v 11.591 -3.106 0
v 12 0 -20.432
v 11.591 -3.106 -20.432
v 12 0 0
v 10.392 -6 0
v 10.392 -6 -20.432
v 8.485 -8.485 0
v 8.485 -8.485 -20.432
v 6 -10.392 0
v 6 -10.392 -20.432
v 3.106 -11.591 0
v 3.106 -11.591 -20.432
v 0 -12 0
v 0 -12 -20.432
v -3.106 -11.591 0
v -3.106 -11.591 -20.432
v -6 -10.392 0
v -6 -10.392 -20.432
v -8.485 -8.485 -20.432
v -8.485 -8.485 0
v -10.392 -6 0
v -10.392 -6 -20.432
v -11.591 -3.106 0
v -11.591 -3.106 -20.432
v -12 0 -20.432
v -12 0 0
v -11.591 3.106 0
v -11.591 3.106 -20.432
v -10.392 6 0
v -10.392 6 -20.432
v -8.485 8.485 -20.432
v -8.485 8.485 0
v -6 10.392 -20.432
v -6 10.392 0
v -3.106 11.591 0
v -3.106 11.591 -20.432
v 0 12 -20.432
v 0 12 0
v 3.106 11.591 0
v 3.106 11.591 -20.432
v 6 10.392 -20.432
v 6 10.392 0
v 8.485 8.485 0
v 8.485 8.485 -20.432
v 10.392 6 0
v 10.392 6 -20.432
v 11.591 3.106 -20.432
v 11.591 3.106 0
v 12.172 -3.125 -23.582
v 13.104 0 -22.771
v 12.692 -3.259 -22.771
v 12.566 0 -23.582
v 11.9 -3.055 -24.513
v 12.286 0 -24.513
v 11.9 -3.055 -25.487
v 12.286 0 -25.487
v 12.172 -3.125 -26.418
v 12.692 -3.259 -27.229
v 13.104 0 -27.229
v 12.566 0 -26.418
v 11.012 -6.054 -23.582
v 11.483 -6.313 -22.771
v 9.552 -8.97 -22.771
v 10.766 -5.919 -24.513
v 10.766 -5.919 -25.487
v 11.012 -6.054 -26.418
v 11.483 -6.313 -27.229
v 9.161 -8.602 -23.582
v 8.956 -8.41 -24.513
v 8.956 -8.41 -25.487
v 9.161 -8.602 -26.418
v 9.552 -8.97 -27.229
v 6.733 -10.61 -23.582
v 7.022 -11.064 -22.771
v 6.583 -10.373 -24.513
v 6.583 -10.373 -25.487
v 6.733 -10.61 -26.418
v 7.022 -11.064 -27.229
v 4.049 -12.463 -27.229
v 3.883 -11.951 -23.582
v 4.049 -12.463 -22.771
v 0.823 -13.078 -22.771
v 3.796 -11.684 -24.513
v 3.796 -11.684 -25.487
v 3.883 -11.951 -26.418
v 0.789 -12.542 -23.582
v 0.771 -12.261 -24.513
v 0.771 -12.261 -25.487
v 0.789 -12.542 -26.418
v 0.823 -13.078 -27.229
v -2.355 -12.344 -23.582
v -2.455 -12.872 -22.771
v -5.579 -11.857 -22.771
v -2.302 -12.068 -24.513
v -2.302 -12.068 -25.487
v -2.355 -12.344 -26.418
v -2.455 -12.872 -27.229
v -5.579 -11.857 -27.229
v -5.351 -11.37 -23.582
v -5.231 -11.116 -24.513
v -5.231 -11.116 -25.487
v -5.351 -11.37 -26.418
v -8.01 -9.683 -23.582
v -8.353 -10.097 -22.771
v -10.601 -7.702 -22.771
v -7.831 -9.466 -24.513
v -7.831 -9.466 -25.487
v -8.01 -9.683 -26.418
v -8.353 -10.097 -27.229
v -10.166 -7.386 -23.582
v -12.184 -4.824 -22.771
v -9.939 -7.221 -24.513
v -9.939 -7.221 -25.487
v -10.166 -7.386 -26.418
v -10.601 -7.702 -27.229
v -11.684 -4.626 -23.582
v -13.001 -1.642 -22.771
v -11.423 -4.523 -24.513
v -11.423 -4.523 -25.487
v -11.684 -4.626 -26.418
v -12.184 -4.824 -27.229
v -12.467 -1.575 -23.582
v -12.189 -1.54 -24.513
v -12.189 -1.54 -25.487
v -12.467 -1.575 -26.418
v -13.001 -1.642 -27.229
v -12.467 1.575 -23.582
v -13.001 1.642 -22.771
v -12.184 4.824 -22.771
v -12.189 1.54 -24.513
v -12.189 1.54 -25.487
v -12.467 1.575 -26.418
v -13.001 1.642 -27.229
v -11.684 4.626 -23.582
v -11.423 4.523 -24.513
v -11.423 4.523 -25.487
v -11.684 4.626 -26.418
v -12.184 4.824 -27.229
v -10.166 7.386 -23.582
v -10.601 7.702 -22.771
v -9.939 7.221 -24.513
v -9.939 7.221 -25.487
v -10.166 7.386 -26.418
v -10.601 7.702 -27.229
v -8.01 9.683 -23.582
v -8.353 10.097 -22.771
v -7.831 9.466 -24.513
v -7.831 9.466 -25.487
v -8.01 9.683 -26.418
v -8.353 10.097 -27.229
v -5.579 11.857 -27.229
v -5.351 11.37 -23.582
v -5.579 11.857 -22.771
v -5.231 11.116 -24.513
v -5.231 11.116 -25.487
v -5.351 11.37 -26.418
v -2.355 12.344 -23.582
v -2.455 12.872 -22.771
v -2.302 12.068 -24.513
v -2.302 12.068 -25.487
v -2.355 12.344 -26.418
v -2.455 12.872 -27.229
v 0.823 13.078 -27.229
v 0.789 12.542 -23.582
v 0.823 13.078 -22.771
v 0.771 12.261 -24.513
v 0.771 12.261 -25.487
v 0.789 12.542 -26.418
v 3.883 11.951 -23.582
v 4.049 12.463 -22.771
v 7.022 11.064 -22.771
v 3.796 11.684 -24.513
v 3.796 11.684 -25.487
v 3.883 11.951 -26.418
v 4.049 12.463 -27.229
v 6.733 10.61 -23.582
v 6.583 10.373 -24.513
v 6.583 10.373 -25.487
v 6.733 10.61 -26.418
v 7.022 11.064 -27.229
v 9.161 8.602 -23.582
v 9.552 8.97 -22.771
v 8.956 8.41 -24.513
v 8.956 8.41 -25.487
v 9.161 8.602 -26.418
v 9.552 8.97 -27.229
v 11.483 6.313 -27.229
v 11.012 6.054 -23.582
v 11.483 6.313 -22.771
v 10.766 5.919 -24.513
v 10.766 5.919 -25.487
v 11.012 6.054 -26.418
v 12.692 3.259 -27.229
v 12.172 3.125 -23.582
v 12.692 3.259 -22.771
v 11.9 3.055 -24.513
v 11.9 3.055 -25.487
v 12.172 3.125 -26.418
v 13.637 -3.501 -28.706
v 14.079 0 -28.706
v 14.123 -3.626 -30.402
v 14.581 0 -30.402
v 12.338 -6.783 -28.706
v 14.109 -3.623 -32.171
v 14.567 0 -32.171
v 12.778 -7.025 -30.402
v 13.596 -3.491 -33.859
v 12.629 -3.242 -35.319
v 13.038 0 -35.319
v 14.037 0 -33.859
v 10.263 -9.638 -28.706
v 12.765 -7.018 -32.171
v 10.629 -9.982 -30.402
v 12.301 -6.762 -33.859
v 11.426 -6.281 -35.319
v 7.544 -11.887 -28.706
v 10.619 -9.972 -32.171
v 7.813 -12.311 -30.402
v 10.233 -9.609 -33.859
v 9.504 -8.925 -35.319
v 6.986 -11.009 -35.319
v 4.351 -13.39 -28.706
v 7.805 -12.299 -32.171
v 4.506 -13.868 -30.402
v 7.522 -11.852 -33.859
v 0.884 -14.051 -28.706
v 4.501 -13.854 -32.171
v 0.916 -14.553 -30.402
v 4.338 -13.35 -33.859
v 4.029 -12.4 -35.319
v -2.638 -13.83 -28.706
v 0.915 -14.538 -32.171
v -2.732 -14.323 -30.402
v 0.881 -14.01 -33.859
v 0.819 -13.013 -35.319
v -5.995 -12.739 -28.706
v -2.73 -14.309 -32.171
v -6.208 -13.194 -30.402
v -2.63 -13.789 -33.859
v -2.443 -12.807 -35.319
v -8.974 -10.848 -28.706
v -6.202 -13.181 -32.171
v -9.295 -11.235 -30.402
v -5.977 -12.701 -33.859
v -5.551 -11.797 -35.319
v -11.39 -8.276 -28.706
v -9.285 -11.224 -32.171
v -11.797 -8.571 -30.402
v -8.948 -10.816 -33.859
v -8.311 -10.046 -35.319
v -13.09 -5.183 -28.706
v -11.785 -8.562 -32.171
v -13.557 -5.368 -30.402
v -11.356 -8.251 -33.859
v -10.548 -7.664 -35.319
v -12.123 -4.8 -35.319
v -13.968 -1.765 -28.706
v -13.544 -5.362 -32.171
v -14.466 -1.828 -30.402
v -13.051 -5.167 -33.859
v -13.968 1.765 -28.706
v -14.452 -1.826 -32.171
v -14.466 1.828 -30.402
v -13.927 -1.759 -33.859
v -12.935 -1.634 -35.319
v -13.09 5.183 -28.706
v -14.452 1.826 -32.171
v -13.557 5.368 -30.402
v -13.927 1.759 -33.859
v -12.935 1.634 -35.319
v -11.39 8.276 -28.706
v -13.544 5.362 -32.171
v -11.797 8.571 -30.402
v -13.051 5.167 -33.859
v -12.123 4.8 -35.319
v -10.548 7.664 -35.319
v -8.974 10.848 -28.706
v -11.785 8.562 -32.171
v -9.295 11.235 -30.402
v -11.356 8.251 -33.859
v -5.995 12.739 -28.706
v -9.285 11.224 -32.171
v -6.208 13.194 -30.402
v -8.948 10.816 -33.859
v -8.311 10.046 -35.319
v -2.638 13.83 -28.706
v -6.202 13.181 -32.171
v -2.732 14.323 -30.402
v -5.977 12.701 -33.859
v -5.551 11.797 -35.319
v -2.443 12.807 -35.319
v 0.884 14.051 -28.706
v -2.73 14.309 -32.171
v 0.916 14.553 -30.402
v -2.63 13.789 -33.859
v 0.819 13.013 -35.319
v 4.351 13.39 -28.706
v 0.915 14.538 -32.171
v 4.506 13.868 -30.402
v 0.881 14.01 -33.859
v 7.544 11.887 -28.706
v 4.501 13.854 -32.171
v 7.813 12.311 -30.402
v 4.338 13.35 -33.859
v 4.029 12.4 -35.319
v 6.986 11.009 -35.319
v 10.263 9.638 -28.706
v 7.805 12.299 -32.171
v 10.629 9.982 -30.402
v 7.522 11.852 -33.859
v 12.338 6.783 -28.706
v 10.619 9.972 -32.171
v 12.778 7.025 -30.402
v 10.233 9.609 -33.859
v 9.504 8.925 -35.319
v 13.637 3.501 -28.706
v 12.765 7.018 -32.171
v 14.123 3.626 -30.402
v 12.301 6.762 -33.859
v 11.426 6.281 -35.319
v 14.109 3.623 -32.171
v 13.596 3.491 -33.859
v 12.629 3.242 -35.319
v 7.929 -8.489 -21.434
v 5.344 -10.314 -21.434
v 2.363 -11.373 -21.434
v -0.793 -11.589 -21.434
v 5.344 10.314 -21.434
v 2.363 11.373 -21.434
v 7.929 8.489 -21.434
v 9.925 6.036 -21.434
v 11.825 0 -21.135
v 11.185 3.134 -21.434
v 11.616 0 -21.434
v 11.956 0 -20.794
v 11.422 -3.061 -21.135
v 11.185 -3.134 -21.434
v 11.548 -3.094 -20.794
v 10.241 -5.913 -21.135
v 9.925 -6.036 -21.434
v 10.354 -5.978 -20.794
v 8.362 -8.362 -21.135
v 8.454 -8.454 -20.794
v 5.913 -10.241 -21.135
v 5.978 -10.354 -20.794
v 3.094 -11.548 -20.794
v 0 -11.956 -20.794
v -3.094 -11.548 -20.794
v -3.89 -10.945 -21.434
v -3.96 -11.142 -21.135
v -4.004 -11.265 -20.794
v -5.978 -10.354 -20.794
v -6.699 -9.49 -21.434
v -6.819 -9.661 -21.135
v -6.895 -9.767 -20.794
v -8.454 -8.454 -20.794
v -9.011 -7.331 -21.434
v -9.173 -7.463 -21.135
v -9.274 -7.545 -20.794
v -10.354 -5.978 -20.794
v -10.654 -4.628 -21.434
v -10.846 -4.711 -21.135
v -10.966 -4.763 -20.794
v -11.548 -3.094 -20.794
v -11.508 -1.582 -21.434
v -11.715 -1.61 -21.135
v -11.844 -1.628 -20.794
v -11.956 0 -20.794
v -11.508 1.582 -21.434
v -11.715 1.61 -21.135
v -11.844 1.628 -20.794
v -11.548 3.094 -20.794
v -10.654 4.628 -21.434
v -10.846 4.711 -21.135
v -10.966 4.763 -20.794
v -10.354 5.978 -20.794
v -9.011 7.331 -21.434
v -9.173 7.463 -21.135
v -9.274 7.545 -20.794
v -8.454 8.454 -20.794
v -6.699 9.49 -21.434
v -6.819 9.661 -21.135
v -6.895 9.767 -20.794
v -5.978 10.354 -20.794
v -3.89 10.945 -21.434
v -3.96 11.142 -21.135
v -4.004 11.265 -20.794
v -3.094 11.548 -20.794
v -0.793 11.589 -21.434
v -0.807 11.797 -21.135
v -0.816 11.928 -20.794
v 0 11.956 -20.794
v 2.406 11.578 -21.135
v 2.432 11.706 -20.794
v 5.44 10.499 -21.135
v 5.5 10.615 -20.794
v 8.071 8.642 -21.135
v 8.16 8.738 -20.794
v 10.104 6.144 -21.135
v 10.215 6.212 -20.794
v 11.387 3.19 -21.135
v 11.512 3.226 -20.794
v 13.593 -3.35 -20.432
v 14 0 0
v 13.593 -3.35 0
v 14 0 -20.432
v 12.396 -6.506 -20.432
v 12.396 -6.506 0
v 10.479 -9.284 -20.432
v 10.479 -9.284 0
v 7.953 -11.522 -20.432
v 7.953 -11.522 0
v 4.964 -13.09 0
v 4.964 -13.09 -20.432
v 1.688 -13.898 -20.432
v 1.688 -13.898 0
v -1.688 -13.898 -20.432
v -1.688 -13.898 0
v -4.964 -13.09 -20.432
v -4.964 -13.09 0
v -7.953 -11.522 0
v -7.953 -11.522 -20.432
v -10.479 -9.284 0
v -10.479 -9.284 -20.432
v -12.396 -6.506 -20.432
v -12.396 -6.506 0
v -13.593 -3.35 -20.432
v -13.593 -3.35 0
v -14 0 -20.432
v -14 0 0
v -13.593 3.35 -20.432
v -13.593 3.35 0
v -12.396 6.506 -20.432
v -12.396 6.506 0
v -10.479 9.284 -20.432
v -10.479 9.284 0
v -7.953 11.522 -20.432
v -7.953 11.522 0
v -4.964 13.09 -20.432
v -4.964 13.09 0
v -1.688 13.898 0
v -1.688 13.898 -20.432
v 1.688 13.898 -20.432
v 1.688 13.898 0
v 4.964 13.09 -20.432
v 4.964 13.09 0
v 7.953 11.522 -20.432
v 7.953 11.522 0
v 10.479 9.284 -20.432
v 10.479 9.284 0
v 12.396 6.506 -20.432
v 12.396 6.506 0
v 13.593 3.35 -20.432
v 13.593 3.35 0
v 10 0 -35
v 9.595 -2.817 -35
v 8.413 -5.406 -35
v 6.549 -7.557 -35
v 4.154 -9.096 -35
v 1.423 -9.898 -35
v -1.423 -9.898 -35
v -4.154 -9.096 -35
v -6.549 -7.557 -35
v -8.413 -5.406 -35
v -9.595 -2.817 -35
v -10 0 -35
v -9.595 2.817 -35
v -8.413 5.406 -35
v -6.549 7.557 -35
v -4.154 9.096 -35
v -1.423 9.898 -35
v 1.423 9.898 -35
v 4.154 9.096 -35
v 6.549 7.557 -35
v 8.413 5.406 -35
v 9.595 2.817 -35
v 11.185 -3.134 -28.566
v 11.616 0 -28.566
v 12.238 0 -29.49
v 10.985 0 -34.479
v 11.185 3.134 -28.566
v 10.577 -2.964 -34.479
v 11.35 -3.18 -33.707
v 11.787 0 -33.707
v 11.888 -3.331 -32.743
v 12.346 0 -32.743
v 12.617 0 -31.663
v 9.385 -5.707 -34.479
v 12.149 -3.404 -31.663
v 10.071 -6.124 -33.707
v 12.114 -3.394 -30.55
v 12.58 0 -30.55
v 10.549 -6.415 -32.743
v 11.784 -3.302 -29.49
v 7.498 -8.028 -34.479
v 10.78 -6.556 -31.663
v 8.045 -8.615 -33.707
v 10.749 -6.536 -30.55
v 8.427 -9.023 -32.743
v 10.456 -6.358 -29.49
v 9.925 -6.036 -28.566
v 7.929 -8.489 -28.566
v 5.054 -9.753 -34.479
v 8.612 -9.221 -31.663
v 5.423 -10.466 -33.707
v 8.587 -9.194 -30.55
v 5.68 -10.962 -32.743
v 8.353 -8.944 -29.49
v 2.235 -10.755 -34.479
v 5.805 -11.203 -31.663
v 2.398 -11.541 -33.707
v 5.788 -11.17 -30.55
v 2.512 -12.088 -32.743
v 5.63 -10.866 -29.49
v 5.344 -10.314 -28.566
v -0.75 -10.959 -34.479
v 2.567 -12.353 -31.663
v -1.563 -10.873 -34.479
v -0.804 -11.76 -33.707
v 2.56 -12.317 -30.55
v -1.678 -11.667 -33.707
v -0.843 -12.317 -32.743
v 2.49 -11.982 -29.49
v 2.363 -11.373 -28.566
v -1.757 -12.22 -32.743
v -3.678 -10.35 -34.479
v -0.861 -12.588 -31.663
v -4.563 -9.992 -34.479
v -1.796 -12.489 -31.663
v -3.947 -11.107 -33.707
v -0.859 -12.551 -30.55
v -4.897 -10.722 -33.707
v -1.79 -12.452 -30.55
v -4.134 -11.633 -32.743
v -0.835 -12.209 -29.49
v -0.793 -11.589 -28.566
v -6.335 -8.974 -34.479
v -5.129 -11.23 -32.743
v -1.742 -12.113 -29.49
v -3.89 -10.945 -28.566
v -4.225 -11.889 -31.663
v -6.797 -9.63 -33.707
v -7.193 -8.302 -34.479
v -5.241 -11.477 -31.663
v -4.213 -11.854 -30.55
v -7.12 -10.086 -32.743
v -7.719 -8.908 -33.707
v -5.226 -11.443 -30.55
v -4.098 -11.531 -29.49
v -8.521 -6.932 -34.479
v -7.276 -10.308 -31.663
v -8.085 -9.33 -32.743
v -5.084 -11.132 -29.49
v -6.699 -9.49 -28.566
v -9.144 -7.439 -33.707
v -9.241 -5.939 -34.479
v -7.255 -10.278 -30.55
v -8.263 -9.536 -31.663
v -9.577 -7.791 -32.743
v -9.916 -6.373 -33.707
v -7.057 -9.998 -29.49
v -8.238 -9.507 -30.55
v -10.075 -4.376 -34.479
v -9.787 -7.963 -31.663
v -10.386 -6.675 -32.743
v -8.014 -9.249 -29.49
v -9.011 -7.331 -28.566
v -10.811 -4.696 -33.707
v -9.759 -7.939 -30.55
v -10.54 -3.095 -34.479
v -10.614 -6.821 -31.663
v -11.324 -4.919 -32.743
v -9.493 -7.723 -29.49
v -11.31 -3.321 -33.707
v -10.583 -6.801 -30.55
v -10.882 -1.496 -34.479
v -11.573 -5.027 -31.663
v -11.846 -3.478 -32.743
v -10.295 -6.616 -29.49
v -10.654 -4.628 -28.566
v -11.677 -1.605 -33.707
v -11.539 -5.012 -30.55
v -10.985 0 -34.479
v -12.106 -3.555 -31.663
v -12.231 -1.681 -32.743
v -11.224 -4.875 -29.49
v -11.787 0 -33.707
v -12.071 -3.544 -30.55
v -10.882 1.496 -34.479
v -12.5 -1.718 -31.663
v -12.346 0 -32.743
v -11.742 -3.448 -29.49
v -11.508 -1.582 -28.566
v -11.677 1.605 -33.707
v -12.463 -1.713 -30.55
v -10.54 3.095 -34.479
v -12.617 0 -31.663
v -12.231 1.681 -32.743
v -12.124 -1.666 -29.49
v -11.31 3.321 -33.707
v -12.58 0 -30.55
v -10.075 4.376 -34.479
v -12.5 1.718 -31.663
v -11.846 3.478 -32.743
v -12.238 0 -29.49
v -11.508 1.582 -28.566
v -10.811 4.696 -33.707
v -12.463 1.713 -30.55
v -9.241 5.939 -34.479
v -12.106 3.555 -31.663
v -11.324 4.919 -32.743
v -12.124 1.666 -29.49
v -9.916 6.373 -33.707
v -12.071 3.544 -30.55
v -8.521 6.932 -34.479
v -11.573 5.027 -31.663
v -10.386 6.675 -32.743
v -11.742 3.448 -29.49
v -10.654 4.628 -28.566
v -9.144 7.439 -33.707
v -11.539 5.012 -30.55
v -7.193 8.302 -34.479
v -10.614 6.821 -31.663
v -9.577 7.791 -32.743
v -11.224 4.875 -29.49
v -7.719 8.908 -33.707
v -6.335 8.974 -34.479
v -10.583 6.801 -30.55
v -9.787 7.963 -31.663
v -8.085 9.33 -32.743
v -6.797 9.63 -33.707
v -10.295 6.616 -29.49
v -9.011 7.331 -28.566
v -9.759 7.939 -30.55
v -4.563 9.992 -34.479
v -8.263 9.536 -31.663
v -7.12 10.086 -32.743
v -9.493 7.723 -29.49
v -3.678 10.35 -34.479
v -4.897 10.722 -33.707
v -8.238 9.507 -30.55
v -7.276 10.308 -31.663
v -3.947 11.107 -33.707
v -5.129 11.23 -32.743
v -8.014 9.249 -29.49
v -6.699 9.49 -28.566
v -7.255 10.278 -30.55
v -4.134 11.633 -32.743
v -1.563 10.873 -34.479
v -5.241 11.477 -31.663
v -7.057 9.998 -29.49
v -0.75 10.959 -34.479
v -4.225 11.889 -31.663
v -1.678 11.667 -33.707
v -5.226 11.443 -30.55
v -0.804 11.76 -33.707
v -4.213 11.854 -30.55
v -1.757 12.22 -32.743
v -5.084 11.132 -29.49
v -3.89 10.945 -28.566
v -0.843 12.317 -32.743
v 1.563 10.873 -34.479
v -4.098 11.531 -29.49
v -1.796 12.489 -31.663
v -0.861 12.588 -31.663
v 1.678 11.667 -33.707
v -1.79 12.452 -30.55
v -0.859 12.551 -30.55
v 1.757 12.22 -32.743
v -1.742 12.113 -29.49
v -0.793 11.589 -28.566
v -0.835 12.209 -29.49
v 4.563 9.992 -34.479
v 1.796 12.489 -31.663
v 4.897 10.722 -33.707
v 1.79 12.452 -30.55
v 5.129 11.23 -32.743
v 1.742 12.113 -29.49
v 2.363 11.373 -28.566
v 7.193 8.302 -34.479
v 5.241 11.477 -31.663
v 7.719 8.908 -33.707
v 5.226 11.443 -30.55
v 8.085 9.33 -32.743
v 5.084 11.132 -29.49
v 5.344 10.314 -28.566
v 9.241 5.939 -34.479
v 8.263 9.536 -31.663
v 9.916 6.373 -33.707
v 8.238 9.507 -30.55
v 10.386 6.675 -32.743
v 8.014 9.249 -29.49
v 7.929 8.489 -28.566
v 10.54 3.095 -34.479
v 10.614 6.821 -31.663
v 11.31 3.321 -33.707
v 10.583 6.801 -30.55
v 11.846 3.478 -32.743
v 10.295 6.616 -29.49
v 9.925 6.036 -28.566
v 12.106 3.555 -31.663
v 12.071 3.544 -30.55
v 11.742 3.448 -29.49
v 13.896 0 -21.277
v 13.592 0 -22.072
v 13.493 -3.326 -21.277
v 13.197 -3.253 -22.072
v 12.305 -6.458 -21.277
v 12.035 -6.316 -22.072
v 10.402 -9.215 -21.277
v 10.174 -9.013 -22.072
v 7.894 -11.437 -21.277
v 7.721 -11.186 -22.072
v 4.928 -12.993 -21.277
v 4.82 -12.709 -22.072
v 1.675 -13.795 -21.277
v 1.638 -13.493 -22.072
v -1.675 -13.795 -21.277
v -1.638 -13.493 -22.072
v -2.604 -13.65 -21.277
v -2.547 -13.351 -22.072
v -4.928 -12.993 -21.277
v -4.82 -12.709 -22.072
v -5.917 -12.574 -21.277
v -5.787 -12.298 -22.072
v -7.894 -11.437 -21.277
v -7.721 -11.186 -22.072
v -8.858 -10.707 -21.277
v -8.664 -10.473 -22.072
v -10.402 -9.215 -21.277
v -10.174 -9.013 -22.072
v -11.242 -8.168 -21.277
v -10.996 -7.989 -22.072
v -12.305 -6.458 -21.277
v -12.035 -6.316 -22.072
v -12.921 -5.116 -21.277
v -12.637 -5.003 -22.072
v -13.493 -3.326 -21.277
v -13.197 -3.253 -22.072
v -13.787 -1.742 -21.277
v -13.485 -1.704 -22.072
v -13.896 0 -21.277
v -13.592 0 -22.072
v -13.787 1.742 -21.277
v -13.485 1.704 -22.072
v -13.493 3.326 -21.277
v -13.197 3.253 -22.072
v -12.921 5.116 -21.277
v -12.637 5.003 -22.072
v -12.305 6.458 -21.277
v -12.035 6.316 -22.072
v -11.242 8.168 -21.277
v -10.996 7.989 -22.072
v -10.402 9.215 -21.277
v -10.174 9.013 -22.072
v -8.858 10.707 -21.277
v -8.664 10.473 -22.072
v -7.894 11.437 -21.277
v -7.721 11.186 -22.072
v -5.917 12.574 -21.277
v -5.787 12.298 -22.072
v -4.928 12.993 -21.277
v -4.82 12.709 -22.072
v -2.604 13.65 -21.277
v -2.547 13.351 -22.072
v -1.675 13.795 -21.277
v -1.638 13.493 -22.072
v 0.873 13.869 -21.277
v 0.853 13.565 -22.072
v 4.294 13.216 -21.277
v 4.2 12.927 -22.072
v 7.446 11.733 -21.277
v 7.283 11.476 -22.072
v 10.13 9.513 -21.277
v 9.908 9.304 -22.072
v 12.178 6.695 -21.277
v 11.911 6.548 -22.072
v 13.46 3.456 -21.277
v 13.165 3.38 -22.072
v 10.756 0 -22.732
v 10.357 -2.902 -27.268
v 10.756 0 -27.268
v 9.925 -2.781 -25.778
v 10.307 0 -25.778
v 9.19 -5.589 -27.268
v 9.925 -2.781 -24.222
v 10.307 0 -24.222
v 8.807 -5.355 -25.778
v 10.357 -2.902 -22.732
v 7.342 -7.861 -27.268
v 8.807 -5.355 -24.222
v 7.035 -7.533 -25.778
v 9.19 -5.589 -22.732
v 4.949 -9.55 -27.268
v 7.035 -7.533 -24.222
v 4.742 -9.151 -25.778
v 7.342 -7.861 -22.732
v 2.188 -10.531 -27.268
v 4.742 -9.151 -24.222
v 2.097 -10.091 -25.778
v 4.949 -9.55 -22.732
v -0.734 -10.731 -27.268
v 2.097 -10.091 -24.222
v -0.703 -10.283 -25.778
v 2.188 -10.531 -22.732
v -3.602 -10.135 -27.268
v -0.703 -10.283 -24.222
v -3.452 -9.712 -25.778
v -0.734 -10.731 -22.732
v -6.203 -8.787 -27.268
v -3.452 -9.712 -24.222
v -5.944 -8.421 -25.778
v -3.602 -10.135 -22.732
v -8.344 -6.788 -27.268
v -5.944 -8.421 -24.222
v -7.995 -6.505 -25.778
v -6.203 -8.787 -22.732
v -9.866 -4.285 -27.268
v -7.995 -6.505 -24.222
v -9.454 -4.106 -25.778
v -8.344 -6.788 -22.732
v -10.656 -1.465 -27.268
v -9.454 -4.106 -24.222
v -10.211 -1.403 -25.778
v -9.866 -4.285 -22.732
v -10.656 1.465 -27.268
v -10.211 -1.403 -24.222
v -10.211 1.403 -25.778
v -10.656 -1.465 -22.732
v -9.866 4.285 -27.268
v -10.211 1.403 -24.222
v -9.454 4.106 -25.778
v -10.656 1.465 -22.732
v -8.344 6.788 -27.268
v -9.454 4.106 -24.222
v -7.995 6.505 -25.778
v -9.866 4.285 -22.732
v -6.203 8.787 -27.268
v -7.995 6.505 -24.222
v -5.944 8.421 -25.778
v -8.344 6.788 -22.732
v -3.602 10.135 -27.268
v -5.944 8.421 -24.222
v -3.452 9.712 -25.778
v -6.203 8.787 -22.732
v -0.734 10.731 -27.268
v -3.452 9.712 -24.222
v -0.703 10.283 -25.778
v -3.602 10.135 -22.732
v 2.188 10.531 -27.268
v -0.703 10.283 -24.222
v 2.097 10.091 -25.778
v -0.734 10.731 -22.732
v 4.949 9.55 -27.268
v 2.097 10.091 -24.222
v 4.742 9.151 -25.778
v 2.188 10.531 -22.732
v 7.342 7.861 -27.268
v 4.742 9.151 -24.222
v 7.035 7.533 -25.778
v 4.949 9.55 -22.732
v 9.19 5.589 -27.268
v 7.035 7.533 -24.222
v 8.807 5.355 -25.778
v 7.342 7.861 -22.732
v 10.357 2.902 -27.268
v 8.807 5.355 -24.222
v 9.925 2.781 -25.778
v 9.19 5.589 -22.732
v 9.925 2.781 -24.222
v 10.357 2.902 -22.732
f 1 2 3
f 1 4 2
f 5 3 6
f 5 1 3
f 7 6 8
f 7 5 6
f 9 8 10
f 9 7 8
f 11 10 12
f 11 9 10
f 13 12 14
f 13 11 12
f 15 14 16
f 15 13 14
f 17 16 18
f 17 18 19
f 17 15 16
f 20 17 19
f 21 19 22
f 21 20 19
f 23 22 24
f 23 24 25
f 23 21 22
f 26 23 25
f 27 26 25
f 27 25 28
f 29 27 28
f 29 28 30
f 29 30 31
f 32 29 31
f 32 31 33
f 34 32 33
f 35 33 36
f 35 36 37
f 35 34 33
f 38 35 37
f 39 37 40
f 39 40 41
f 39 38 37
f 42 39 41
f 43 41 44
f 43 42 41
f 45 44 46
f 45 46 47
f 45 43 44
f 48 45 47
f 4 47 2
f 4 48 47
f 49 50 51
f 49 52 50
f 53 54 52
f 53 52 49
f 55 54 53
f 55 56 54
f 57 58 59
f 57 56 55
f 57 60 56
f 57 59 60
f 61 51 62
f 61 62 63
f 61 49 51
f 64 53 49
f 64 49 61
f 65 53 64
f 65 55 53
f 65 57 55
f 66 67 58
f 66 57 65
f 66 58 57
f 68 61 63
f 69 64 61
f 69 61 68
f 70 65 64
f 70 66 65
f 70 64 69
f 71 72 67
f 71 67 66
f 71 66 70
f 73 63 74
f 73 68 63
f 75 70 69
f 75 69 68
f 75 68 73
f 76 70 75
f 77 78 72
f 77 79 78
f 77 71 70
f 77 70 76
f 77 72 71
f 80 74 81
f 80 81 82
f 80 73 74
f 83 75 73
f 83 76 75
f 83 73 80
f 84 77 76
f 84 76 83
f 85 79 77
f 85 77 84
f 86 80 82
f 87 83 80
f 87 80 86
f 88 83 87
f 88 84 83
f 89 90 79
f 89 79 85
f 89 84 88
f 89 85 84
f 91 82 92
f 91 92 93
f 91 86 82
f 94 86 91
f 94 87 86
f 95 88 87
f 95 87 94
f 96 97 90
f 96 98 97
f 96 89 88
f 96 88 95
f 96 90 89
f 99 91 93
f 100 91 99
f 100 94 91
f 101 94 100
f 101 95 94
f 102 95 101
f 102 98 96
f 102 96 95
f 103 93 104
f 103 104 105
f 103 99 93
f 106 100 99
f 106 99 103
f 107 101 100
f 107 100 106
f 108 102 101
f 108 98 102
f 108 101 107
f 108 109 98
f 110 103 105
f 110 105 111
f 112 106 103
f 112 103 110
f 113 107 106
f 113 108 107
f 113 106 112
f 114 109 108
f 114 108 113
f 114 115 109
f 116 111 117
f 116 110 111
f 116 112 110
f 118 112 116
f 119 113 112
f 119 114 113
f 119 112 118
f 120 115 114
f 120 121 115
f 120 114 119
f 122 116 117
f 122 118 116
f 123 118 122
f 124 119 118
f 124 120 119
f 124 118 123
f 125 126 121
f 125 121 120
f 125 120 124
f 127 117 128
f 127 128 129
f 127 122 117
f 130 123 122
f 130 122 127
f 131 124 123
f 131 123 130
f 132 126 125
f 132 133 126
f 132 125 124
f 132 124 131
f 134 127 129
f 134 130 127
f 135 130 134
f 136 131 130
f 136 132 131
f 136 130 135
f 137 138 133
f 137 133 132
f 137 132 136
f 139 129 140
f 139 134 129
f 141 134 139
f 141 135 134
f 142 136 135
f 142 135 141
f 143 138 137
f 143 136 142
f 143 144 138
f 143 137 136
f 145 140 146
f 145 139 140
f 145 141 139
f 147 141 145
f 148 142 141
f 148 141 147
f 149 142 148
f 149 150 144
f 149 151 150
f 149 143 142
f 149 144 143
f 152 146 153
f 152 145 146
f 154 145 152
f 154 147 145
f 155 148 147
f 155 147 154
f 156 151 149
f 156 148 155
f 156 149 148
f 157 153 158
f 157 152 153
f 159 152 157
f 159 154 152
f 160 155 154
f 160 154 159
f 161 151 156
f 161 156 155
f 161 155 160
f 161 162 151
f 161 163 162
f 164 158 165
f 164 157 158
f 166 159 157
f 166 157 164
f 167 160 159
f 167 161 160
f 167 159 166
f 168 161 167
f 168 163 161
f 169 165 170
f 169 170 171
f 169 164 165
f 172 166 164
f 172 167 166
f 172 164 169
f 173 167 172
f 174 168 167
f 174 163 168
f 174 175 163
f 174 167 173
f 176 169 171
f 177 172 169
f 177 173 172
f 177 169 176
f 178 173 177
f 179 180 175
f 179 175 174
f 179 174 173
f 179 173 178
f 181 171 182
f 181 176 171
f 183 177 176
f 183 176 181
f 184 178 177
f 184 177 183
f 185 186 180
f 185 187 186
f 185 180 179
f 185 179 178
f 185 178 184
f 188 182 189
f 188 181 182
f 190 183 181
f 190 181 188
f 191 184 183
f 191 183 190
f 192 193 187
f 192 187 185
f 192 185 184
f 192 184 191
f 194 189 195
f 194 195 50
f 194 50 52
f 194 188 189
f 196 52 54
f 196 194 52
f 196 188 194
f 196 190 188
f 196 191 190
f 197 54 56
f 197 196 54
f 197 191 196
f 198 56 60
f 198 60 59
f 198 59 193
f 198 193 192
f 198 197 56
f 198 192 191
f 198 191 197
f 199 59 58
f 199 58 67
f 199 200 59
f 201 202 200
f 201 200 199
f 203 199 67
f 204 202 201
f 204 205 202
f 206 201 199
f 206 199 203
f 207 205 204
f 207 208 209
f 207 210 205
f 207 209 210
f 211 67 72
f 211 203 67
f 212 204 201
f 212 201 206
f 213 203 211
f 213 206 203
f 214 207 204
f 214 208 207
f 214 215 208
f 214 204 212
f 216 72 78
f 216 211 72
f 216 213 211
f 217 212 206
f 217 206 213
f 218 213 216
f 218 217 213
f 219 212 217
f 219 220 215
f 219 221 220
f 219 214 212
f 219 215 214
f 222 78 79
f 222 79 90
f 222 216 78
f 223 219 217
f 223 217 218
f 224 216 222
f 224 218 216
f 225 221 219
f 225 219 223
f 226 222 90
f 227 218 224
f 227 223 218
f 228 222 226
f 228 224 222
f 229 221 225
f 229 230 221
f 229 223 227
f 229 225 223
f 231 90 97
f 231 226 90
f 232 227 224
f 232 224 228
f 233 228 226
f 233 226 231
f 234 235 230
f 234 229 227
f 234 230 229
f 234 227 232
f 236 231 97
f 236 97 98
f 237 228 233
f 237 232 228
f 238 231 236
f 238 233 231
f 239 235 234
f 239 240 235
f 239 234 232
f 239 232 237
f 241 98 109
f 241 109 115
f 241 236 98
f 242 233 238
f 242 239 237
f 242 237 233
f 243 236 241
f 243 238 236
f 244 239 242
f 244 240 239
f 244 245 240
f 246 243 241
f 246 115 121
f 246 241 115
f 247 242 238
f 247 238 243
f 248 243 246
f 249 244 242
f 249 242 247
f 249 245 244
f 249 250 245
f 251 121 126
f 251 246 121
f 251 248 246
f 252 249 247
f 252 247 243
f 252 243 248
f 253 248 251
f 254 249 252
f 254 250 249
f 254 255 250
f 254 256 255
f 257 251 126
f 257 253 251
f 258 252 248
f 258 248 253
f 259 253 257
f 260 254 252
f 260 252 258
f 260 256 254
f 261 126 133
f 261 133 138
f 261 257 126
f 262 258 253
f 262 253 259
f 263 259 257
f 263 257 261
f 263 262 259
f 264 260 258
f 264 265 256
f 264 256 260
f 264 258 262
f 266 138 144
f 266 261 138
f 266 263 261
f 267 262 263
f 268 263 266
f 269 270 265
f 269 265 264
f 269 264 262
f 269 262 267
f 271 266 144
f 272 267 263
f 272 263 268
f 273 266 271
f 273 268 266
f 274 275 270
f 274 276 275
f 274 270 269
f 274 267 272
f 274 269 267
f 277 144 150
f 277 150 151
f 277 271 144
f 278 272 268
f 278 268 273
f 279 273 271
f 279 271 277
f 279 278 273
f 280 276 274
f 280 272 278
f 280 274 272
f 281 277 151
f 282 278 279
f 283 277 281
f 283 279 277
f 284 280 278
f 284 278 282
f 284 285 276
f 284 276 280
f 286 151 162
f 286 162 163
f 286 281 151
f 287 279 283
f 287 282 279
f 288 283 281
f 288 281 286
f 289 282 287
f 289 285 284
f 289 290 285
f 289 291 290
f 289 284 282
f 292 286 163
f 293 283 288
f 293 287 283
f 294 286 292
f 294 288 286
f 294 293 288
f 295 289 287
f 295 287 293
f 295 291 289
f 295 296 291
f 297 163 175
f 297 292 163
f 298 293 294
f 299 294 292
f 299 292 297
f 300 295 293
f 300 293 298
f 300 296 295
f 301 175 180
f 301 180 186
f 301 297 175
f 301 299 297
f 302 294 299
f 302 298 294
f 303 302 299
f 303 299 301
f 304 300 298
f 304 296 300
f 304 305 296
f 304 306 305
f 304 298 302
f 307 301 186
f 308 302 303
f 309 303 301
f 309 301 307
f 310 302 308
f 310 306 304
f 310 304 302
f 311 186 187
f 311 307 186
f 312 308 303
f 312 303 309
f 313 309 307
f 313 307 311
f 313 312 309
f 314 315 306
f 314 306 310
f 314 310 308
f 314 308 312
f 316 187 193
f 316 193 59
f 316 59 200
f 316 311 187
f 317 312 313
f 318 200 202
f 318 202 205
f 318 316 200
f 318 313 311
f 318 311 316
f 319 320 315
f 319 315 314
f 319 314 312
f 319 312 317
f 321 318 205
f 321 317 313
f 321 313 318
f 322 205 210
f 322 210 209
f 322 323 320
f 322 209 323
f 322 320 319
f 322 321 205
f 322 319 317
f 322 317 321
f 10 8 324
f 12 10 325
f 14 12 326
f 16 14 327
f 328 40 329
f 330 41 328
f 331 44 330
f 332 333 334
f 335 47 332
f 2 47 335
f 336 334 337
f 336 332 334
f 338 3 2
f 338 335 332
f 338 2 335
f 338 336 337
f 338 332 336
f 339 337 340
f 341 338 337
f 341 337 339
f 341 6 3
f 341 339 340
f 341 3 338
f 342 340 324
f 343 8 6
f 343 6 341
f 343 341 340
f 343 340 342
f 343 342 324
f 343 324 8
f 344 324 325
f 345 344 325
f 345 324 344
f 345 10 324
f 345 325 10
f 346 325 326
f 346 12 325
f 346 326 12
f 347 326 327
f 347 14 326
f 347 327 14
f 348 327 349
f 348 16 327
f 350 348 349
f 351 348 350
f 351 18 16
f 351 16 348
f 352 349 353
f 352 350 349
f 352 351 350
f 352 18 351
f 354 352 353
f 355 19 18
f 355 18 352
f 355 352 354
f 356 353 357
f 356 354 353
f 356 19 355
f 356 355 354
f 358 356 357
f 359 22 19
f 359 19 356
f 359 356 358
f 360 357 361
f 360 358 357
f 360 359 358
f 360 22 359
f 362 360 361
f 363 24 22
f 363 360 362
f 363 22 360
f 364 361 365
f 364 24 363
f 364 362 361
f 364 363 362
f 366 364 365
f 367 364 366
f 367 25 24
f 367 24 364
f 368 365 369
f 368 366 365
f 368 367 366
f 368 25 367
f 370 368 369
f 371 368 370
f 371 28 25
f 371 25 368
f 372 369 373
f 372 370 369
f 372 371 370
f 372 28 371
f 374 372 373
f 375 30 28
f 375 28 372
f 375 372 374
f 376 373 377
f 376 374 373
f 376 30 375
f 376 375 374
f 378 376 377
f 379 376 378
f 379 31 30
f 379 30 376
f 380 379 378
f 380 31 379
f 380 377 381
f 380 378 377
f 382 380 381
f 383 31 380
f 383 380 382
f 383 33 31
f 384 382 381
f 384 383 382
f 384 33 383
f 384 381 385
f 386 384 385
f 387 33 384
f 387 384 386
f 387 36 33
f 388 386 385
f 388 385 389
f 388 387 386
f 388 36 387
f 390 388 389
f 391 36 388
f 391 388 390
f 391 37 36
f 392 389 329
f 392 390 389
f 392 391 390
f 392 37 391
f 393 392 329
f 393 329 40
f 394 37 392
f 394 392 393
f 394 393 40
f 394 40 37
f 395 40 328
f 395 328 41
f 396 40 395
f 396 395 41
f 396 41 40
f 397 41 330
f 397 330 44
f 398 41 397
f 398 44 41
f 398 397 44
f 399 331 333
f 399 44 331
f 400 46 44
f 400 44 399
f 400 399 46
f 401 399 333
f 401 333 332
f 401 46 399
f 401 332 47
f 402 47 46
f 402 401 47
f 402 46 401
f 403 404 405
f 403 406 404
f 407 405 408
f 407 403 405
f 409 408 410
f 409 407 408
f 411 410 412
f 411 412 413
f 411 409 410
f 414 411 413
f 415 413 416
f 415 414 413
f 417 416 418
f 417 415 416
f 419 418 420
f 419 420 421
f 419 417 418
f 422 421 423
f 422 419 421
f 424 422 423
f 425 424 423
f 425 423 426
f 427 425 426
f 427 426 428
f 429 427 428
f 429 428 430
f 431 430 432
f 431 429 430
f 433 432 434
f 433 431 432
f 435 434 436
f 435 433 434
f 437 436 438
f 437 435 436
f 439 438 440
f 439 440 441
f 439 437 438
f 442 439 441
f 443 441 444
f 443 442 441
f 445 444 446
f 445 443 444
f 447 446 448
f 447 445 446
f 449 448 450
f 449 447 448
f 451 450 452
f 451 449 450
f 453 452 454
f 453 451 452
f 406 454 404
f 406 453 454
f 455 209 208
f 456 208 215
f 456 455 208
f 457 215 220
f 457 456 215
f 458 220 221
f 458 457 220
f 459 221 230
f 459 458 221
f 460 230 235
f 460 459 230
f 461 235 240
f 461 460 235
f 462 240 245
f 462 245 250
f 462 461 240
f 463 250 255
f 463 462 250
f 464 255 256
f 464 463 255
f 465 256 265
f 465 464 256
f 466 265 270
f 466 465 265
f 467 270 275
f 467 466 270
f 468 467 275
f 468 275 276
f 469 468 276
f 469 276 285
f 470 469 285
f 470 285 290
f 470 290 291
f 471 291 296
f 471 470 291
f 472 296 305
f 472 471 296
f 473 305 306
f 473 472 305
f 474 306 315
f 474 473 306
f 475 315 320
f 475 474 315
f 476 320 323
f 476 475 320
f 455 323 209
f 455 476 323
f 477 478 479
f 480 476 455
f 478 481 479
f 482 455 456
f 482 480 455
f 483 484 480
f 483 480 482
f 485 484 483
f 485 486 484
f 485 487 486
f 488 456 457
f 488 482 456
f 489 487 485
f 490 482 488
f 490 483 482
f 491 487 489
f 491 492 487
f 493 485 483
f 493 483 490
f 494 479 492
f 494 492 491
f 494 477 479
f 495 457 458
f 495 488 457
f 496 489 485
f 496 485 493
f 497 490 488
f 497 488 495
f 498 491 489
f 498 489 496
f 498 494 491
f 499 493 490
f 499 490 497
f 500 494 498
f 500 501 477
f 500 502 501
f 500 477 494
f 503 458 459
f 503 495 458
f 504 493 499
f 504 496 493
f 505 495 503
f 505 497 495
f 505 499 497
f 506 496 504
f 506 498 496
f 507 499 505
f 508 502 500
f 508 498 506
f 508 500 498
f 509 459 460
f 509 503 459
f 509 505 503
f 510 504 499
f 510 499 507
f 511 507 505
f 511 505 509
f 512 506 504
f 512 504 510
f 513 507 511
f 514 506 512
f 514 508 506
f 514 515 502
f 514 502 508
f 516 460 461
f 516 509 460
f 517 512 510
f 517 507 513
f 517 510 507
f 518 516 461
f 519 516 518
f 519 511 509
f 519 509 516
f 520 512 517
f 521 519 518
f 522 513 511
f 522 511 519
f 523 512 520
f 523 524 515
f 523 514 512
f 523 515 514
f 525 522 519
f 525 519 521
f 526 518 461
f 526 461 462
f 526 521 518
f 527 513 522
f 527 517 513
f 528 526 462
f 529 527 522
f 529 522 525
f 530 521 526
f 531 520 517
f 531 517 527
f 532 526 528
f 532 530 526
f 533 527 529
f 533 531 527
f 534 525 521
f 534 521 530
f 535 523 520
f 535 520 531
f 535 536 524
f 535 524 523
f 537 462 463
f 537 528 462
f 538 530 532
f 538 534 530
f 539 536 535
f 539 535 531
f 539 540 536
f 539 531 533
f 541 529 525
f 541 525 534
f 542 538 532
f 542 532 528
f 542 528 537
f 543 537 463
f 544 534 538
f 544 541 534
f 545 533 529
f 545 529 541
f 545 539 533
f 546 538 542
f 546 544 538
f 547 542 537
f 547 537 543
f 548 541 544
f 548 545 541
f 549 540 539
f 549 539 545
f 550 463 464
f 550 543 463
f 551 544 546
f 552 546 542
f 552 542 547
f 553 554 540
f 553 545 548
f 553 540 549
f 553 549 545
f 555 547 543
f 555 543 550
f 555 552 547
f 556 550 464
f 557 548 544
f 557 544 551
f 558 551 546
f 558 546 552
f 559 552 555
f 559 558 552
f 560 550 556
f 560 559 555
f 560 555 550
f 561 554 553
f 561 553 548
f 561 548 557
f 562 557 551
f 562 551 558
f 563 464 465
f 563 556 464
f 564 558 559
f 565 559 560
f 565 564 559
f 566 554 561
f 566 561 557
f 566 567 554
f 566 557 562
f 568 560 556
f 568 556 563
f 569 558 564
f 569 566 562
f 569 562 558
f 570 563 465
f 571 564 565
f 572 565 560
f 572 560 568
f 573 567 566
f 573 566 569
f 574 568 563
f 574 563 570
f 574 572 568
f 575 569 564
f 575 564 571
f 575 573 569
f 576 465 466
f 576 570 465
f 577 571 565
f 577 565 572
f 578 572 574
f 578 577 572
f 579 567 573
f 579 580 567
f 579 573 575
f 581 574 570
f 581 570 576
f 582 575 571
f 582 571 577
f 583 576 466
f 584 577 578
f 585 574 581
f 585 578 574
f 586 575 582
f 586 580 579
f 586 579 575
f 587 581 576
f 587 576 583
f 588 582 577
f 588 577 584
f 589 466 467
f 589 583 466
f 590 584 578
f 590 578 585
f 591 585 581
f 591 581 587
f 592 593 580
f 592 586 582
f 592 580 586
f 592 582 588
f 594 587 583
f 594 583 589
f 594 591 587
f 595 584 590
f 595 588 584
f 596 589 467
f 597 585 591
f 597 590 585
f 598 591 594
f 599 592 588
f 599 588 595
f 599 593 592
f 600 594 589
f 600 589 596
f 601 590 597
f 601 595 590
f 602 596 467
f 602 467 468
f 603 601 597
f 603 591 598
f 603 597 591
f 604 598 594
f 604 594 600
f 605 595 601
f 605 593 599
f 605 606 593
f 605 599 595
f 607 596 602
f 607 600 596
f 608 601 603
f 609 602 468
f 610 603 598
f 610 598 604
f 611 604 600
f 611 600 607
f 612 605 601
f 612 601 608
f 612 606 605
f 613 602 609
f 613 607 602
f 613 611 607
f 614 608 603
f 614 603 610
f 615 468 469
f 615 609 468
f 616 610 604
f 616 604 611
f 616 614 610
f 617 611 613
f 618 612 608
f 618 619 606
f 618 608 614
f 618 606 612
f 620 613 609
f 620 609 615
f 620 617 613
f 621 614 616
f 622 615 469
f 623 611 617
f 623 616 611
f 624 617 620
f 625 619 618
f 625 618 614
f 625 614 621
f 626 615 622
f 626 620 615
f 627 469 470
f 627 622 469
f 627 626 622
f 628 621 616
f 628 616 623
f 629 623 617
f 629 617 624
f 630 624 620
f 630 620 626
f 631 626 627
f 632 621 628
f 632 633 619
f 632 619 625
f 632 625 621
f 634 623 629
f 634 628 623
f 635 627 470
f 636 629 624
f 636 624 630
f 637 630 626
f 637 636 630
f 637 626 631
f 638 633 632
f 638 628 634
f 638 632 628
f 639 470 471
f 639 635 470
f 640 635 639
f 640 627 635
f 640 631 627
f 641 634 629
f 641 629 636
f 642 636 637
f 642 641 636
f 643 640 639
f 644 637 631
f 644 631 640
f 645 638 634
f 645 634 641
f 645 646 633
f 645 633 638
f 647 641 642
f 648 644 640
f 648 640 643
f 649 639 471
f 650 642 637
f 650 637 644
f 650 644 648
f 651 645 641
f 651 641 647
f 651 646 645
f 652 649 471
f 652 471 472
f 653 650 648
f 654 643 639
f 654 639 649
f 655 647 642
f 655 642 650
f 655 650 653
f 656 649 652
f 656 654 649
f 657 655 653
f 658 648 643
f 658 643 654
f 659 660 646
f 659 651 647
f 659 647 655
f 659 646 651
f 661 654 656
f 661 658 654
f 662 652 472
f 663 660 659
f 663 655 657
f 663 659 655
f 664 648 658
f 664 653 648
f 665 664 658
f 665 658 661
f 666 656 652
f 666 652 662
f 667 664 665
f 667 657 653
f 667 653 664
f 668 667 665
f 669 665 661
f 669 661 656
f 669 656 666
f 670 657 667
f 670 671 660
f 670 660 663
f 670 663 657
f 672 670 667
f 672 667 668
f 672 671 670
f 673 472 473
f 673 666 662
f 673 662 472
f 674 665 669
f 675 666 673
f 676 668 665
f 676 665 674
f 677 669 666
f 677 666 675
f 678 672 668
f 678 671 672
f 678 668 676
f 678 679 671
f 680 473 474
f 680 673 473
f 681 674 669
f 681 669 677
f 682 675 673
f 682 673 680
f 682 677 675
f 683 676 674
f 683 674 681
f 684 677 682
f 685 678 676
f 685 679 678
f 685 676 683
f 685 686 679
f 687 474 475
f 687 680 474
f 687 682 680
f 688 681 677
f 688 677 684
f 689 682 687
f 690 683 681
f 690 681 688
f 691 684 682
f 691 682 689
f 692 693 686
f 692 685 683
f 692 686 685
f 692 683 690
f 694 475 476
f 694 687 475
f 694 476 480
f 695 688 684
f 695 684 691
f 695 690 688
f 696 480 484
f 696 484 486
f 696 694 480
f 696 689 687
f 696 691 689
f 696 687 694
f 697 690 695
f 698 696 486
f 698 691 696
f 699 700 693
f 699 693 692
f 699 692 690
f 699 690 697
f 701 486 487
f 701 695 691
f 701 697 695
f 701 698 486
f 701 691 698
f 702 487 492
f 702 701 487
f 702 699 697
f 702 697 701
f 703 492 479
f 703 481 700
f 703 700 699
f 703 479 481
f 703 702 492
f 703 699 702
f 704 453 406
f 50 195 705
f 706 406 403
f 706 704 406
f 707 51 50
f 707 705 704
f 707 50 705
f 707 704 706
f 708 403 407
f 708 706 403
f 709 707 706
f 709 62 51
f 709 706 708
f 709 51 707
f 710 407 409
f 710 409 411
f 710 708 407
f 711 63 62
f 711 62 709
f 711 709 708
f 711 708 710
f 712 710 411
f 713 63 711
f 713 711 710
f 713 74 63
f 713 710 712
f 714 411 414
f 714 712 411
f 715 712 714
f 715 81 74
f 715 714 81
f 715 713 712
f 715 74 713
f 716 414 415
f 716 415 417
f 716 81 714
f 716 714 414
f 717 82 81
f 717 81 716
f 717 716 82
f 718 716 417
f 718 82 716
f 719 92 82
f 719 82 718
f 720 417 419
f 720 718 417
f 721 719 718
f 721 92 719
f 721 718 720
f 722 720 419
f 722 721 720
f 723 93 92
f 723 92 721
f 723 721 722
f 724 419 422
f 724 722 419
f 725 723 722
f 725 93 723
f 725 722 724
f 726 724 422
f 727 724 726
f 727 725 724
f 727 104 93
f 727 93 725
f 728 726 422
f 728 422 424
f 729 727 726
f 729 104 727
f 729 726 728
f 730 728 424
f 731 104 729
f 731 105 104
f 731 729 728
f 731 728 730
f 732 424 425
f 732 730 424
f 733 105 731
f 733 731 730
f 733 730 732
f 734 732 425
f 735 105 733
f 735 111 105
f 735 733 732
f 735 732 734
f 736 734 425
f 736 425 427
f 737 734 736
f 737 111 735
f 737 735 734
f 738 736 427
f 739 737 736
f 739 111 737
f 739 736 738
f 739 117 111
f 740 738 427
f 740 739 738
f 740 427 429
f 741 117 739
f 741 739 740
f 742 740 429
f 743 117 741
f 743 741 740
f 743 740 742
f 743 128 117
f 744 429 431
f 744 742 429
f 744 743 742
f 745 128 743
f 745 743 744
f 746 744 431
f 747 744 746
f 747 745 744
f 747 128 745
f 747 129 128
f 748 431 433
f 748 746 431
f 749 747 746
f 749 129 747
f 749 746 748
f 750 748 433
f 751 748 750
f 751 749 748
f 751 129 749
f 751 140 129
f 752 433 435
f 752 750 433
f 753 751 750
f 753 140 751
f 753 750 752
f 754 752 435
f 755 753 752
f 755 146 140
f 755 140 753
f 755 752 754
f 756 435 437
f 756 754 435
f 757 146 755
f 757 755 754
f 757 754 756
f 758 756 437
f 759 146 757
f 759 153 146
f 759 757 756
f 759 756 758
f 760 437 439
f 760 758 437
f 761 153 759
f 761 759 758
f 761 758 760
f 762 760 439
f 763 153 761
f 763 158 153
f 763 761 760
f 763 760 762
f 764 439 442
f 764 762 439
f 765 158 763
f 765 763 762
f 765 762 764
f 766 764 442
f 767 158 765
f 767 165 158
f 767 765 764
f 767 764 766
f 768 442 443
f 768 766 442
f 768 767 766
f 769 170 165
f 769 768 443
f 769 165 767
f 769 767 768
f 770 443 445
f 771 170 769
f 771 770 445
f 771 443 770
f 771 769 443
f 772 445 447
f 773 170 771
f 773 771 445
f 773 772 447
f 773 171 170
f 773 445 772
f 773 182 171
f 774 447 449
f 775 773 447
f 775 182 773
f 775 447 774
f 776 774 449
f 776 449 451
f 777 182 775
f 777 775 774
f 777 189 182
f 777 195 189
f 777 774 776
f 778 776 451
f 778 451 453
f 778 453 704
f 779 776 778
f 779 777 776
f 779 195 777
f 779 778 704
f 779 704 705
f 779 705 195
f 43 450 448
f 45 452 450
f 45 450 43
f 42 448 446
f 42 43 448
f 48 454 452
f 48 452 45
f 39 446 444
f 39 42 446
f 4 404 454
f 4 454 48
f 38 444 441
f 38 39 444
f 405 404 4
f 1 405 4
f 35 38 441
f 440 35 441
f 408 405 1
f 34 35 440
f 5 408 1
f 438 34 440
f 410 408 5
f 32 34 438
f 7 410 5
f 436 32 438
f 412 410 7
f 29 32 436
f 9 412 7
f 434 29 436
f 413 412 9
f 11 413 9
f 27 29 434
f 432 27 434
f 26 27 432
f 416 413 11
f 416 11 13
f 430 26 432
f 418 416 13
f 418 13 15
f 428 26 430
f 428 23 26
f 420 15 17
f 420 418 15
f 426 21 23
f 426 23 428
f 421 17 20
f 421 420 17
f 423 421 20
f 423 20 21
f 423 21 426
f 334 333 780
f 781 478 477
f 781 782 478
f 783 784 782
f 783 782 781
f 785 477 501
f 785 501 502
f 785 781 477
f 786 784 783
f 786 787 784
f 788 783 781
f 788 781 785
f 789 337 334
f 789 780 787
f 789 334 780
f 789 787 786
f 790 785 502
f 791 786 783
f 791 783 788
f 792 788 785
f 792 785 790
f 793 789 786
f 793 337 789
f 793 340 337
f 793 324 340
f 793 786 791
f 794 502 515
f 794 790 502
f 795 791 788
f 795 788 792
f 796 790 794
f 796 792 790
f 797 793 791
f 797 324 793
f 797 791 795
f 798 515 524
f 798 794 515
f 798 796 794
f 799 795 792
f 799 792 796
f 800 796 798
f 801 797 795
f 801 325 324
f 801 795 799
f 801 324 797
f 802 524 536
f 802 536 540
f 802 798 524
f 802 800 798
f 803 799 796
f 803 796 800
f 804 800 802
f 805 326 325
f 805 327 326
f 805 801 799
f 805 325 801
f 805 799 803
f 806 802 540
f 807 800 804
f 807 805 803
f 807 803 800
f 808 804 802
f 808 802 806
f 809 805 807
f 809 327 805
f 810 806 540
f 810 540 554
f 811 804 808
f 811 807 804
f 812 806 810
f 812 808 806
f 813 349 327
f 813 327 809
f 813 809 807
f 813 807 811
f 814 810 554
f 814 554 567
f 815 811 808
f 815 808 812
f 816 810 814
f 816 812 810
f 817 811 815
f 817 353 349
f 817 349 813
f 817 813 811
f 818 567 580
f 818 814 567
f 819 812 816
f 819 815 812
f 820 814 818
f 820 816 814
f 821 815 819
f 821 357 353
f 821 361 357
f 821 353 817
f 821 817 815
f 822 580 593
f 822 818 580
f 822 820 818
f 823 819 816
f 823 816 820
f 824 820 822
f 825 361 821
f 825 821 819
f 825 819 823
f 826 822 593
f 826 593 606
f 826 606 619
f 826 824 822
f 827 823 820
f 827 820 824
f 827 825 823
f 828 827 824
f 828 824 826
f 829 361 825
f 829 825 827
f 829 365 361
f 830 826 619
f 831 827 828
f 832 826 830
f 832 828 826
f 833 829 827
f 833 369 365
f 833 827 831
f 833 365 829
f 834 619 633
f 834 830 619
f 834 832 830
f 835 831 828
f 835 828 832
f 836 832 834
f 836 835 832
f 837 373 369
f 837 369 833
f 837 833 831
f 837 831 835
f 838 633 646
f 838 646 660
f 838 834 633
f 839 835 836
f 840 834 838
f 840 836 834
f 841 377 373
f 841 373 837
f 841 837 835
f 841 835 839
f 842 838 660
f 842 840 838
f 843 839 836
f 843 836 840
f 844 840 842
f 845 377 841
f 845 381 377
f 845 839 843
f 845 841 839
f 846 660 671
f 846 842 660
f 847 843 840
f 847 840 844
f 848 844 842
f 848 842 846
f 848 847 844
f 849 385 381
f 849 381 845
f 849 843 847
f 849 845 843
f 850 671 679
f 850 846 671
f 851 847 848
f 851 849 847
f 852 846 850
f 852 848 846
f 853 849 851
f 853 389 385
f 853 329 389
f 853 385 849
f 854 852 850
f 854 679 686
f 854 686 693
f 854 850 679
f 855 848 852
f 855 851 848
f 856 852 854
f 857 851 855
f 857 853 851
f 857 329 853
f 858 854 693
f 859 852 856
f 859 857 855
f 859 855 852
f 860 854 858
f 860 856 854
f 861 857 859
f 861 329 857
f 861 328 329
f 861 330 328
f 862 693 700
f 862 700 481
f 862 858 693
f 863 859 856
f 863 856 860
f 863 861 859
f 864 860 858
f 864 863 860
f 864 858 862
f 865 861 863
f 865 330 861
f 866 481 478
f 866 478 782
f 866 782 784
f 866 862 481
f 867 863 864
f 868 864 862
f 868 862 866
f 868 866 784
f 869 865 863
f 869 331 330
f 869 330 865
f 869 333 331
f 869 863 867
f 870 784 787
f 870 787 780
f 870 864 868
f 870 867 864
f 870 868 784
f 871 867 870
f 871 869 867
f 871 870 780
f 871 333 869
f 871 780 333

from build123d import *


with BuildPart() as part:
    # 草图2 → 旋转1 (revolve)
    with BuildSketch(Plane(origin=(0, 0, 0), x_dir=(1, 0, 0), z_dir=(0, 1, 0))):
        with BuildLine():
            ThreePointArc((13.104115055, 22.770530099), (12.25, 25), (13.104115055, 27.229469901))
            ThreePointArc((13.104115055, 27.229469901), (14.639719012, 31.287170848), (13.038257502, 35.319333731))
            Line((13.038257502, 35.319333731), (10, 35))
            ThreePointArc((10, 35), (12.519423129, 32.212719337), (11.616049309, 28.565755924))
            ThreePointArc((11.616049309, 28.565755924), (10.25, 25), (11.616049309, 21.434244076))
            ThreePointArc((11.616049309, 21.434244076), (11.900727305, 20.968651416), (12, 20.432029558))
            Line((12, 20.432029558), (12, 0))
            Line((12, 0), (14, 0))
            Line((14, 0), (14, 20.432029558))
            ThreePointArc((14, 20.432029558), (13.768363711, 21.684147226), (13.104115055, 22.770530099))
        make_face()
    revolve(axis=Axis((0, 0, 0), (0, 0, -1)))


solid = part.part
